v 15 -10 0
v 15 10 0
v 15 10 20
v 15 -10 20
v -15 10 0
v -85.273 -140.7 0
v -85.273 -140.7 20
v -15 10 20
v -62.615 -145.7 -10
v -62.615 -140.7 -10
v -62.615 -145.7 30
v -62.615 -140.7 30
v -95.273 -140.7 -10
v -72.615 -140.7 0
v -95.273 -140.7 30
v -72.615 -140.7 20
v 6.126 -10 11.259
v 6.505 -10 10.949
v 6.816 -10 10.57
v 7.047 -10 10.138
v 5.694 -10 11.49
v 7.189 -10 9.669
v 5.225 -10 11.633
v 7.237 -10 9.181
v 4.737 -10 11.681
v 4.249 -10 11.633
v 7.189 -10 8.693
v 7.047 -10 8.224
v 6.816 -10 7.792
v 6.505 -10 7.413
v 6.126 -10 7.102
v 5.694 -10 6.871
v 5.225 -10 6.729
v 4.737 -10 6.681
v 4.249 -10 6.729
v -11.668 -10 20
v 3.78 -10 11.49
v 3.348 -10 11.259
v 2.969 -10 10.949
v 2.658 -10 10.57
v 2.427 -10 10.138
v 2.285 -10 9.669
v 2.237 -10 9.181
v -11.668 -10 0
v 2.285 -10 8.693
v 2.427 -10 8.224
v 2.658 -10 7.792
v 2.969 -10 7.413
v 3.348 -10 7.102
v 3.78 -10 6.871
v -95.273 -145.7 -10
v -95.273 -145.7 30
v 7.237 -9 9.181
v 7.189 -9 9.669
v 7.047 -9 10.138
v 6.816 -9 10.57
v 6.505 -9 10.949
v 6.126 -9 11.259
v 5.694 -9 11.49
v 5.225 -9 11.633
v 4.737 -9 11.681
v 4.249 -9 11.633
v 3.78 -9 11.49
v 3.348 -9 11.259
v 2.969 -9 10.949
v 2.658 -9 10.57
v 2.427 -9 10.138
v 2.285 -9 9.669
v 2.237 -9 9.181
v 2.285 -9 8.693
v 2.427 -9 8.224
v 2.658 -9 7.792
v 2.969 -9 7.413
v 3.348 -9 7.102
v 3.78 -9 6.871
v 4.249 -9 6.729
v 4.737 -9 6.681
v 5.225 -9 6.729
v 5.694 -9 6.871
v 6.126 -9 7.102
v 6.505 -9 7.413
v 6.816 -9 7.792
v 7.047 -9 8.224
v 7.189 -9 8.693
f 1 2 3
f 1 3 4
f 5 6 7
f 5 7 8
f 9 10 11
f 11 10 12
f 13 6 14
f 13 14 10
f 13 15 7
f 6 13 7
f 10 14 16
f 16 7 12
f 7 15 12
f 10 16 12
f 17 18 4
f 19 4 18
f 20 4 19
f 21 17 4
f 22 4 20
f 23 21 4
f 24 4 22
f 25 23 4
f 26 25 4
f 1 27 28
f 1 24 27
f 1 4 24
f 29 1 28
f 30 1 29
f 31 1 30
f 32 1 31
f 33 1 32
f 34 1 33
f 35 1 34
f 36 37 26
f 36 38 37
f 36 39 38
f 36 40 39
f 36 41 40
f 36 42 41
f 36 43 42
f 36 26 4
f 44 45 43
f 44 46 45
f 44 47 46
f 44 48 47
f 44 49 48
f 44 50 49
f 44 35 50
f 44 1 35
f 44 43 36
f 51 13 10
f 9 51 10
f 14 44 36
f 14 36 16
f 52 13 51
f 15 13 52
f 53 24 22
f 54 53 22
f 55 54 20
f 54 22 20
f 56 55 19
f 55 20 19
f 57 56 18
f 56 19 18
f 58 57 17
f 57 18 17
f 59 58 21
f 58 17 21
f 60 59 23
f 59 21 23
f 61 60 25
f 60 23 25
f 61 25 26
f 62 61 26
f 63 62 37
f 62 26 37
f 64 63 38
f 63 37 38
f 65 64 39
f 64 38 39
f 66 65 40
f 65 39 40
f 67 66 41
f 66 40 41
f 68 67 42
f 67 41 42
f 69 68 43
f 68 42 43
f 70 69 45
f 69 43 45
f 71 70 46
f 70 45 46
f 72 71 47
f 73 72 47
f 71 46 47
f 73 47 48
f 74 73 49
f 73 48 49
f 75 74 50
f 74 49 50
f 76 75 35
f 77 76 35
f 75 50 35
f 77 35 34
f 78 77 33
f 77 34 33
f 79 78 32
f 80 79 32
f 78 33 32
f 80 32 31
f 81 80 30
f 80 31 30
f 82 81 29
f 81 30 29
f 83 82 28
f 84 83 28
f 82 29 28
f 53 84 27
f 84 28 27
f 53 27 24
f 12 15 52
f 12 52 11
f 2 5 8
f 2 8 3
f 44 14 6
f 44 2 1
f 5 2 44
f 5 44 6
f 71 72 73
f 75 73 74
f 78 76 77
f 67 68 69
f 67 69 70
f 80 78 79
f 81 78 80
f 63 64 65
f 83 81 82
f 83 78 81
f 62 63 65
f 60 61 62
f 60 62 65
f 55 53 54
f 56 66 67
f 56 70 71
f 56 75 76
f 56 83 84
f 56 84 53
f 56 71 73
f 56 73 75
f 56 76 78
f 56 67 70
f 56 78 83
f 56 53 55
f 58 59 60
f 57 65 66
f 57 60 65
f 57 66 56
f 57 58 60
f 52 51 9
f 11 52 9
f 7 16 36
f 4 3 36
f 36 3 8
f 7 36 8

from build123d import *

# Parameters (mm, degrees)
BOSS_EXTRUDE1_DEPTH = 20
SKETCH2_W           = 32.657953652
SKETCH2_H           = 40
BOSS_EXTRUDE2_DEPTH = 5
SKETCH3_R           = 2.5
CUT_EXTRUDE1_DEPTH  = 1


with BuildPart() as part:
    # Sketch1 → Boss-Extrude1 (new body)
    with BuildSketch(Plane.XY):
        Polygon((-11.668199512, -10), (-72.614610432, -140.7), (-85.272564084, -140.7), (-15, 10), (15, 10), (15, -10), align=None)
    extrude(amount=BOSS_EXTRUDE1_DEPTH)

    # Sketch2 → Boss-Extrude2 (add)
    with BuildSketch(Plane.XZ.offset(140.7)):
        with Locations((-78.943587258, 10)):
            Rectangle(SKETCH2_W, SKETCH2_H)
    extrude(amount=BOSS_EXTRUDE2_DEPTH)

    # Sketch3 → Cut-Extrude1 (cut)
    with BuildSketch(Plane.XZ.offset(10)):
        with Locations((4.736957345, 9.180800469)):
            Circle(SKETCH3_R)
    extrude(amount=-CUT_EXTRUDE1_DEPTH, mode=Mode.SUBTRACT)


solid = part.part
